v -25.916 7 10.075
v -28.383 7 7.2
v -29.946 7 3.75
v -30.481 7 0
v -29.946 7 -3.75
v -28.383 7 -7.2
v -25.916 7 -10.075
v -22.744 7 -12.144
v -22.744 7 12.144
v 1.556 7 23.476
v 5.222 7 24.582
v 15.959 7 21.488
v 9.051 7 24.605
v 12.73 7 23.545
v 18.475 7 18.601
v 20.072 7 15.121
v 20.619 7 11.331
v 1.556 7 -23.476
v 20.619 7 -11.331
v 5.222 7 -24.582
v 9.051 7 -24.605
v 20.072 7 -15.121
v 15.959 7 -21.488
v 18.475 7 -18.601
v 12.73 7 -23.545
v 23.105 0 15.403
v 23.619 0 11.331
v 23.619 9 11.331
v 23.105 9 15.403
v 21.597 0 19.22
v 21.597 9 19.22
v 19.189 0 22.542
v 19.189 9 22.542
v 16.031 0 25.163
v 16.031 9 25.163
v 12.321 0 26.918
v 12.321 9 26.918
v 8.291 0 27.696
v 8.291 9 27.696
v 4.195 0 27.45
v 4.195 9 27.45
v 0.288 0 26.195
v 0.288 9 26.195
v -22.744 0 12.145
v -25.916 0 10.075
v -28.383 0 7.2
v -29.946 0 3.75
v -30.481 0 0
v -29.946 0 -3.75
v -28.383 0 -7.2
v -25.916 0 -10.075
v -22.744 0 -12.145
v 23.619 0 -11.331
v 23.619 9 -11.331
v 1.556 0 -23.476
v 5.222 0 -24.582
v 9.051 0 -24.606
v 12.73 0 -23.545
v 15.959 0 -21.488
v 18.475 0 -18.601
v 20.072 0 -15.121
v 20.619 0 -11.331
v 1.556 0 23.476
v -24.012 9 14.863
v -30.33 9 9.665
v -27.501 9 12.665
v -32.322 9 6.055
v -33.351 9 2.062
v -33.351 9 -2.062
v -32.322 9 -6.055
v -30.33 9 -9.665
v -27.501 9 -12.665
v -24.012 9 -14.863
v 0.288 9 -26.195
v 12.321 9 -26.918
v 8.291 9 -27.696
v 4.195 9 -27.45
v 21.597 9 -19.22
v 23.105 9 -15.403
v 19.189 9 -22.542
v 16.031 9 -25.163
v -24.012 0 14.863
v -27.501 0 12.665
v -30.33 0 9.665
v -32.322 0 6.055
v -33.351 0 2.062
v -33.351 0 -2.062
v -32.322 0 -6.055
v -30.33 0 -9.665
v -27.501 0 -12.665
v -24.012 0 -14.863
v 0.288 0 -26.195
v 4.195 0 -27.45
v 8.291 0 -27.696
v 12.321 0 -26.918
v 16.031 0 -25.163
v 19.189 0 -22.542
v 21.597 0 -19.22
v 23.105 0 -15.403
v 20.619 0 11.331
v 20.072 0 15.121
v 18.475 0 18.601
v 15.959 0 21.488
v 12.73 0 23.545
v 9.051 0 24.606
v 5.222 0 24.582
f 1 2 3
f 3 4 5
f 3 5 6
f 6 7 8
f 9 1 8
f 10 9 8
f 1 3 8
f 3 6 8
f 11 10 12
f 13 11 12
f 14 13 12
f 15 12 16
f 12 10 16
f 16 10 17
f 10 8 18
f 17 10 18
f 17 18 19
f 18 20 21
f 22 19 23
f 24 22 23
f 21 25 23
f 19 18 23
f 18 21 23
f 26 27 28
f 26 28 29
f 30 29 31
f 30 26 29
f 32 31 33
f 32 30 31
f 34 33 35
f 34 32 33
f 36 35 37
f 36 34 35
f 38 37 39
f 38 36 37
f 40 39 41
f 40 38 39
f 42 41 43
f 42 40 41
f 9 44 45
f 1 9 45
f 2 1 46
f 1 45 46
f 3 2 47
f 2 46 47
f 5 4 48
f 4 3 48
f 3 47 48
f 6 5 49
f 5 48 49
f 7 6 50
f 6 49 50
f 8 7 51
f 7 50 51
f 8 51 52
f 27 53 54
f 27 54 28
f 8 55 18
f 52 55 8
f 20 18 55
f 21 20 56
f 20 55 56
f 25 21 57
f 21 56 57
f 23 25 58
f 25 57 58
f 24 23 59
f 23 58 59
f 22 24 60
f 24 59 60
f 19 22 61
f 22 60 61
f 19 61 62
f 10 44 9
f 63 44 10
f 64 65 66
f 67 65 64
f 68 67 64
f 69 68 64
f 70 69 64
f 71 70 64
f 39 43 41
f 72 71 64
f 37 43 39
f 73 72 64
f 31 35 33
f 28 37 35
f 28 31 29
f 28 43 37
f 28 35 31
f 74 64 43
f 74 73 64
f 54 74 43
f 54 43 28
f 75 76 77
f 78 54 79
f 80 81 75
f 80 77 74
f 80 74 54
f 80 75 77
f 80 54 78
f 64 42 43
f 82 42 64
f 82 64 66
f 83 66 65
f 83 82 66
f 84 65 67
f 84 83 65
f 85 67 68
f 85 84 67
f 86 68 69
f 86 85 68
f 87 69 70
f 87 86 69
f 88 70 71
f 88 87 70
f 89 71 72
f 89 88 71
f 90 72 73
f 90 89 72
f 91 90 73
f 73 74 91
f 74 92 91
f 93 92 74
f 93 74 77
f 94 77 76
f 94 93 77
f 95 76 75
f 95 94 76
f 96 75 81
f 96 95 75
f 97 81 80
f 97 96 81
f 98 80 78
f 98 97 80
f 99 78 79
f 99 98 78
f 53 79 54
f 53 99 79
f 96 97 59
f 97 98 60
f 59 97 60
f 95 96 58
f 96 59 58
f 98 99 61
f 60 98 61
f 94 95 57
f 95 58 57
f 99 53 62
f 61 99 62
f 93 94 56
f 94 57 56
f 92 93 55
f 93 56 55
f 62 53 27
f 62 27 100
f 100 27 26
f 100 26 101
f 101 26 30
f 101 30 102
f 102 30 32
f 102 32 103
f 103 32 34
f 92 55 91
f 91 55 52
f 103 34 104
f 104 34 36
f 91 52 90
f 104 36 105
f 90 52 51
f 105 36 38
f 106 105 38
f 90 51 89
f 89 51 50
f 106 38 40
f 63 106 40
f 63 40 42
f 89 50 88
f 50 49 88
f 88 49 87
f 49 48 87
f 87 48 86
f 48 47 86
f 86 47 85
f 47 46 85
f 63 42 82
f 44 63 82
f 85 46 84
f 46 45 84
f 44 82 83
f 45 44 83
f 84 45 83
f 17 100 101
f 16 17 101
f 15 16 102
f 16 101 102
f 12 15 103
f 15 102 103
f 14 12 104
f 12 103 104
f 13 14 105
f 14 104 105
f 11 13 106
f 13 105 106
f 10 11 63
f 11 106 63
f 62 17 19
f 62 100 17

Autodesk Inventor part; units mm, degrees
ref_plane "YZ Plane" through (0, 0, 0) normal (1, 0, 0) x (0, 1, 0)
ref_plane "XZ Plane" through (0, 0, 0) normal (0, 1, 0) x (-1, 0, 0)
ref_plane "XY Plane" through (0, 0, 0) normal (0, 0, 1) x (1, 0, 0)
sketch "Sketch1" plane through (0, 0, 0) normal (0, 1, 0) x (-1, 0, 0)
  line L0 (72.8792, 0) -> (-46.0667, 0) projected
  line L1 (48.7883, 0) -> (-20.6188, 32.3651)
  line L2 (-20.6188, 32.3651) -> (-20.6188, -32.3651)
  line L3 (-20.6188, -32.3651) -> (48.7883, 0)
  circle A0 centre (-7.2188, -11.3313) radius 13.4
  circle A1 centre (-7.2188, 11.3313) radius 13.4
  circle A2 centre (17.0812, 0) radius 13.4
  circle A3 centre (0, 0) radius 20.6188
  line L4 (52.8138, 0) -> (-29.0745, 0)
  line L5 (-23.6188, -37.0741) -> (-23.6188, 37.0741)
  line L6 (-23.6188, 37.0741) -> (55.8869, 0)
  line L7 (-23.6188, -37.0741) -> (55.8869, 0)
  circle A4 centre (-7.2188, 11.3313) radius 16.4
  circle A5 centre (-7.2188, -11.3313) radius 16.4
  circle A6 centre (17.0812, 0) radius 16.4
  point P0 (-1.5557, -23.4758)
  point P1 (-20.6188, -11.3313)
  point P2 (-20.6188, 11.3313)
  point P3 (-1.5557, 23.4758)
  point P4 (22.7443, 12.1445)
  point P5 (22.7443, -12.1445)
  point P6 (-0.2879, -26.1947)
  point P7 (24.0121, -14.8634)
  point P8 (24.0121, 14.8634)
  point P9 (-0.2879, 26.1947)
  point P10 (-23.6188, 11.3313)
  point P11 (-23.6188, -11.3313)
  dimension "d9" = 50
  dimension "d10" = 26.8
  dimension "d11" = 37.7
  dimension "d12" = 26.8
  dimension "d13" = 26.8
  dimension "d14" = 3
  dimension "d15" = 3
extrude "Extrusion1" add sketch "Sketch1" along normal blind 9 contours A6 L1 A4 L6 | A6 L1 | L7 A5 L3 A6 | A6 L3 | A4 L1 | A6 L0 A2 L1 | A5 L3 | L3 A2 L0 A6 | L1 A1 L2 A4 | A5 L2 A0 L3 | A4 L2 L0 L5 | A4 L2 | L5 L0 L2 A5 | A5 L2
sketch "Sketch2" plane through (0, 9, 0) normal (0, 1, 0) x (1, 0, 0)
  line L0 (0.2879, 26.1947) -> (-24.0121, 14.8634) projected
  arc A0 (23.6188, 11.3313) -> (0.2879, 26.1947) centre (7.2188, 11.3313) ccw projected
  line L1 (23.6188, -11.3313) -> (23.6188, 11.3313) projected
  arc A1 (0.2879, -26.1947) -> (23.6188, -11.3313) centre (7.2188, -11.3313) ccw projected
  line L2 (-24.0121, -14.8634) -> (0.2879, -26.1947) projected
  arc A2 (-24.0121, 14.8634) -> (-24.0121, -14.8634) centre (-17.0812, 0) ccw projected
  arc A3 (20.6188, 11.3313) -> (1.5557, 23.4758) centre (7.2188, 11.3313) ccw projected
  line L3 (-22.7443, 12.1445) -> (1.5557, 23.4758) projected
  arc A4 (-22.7443, 12.1445) -> (-22.7443, -12.1445) centre (-17.0812, 0) ccw projected
  line L4 (1.5557, -23.4758) -> (-22.7443, -12.1445) projected
  arc A5 (1.5557, -23.4758) -> (20.6188, -11.3313) centre (7.2188, -11.3313) ccw projected
  line L5 (20.6188, 11.3313) -> (20.6188, -11.3313) projected
extrude "Extrusion2" add sketch "Sketch2" against normal blind 2 contours L5 A5 L4 A4 L3 A3
properties part number "Tri_Box"
